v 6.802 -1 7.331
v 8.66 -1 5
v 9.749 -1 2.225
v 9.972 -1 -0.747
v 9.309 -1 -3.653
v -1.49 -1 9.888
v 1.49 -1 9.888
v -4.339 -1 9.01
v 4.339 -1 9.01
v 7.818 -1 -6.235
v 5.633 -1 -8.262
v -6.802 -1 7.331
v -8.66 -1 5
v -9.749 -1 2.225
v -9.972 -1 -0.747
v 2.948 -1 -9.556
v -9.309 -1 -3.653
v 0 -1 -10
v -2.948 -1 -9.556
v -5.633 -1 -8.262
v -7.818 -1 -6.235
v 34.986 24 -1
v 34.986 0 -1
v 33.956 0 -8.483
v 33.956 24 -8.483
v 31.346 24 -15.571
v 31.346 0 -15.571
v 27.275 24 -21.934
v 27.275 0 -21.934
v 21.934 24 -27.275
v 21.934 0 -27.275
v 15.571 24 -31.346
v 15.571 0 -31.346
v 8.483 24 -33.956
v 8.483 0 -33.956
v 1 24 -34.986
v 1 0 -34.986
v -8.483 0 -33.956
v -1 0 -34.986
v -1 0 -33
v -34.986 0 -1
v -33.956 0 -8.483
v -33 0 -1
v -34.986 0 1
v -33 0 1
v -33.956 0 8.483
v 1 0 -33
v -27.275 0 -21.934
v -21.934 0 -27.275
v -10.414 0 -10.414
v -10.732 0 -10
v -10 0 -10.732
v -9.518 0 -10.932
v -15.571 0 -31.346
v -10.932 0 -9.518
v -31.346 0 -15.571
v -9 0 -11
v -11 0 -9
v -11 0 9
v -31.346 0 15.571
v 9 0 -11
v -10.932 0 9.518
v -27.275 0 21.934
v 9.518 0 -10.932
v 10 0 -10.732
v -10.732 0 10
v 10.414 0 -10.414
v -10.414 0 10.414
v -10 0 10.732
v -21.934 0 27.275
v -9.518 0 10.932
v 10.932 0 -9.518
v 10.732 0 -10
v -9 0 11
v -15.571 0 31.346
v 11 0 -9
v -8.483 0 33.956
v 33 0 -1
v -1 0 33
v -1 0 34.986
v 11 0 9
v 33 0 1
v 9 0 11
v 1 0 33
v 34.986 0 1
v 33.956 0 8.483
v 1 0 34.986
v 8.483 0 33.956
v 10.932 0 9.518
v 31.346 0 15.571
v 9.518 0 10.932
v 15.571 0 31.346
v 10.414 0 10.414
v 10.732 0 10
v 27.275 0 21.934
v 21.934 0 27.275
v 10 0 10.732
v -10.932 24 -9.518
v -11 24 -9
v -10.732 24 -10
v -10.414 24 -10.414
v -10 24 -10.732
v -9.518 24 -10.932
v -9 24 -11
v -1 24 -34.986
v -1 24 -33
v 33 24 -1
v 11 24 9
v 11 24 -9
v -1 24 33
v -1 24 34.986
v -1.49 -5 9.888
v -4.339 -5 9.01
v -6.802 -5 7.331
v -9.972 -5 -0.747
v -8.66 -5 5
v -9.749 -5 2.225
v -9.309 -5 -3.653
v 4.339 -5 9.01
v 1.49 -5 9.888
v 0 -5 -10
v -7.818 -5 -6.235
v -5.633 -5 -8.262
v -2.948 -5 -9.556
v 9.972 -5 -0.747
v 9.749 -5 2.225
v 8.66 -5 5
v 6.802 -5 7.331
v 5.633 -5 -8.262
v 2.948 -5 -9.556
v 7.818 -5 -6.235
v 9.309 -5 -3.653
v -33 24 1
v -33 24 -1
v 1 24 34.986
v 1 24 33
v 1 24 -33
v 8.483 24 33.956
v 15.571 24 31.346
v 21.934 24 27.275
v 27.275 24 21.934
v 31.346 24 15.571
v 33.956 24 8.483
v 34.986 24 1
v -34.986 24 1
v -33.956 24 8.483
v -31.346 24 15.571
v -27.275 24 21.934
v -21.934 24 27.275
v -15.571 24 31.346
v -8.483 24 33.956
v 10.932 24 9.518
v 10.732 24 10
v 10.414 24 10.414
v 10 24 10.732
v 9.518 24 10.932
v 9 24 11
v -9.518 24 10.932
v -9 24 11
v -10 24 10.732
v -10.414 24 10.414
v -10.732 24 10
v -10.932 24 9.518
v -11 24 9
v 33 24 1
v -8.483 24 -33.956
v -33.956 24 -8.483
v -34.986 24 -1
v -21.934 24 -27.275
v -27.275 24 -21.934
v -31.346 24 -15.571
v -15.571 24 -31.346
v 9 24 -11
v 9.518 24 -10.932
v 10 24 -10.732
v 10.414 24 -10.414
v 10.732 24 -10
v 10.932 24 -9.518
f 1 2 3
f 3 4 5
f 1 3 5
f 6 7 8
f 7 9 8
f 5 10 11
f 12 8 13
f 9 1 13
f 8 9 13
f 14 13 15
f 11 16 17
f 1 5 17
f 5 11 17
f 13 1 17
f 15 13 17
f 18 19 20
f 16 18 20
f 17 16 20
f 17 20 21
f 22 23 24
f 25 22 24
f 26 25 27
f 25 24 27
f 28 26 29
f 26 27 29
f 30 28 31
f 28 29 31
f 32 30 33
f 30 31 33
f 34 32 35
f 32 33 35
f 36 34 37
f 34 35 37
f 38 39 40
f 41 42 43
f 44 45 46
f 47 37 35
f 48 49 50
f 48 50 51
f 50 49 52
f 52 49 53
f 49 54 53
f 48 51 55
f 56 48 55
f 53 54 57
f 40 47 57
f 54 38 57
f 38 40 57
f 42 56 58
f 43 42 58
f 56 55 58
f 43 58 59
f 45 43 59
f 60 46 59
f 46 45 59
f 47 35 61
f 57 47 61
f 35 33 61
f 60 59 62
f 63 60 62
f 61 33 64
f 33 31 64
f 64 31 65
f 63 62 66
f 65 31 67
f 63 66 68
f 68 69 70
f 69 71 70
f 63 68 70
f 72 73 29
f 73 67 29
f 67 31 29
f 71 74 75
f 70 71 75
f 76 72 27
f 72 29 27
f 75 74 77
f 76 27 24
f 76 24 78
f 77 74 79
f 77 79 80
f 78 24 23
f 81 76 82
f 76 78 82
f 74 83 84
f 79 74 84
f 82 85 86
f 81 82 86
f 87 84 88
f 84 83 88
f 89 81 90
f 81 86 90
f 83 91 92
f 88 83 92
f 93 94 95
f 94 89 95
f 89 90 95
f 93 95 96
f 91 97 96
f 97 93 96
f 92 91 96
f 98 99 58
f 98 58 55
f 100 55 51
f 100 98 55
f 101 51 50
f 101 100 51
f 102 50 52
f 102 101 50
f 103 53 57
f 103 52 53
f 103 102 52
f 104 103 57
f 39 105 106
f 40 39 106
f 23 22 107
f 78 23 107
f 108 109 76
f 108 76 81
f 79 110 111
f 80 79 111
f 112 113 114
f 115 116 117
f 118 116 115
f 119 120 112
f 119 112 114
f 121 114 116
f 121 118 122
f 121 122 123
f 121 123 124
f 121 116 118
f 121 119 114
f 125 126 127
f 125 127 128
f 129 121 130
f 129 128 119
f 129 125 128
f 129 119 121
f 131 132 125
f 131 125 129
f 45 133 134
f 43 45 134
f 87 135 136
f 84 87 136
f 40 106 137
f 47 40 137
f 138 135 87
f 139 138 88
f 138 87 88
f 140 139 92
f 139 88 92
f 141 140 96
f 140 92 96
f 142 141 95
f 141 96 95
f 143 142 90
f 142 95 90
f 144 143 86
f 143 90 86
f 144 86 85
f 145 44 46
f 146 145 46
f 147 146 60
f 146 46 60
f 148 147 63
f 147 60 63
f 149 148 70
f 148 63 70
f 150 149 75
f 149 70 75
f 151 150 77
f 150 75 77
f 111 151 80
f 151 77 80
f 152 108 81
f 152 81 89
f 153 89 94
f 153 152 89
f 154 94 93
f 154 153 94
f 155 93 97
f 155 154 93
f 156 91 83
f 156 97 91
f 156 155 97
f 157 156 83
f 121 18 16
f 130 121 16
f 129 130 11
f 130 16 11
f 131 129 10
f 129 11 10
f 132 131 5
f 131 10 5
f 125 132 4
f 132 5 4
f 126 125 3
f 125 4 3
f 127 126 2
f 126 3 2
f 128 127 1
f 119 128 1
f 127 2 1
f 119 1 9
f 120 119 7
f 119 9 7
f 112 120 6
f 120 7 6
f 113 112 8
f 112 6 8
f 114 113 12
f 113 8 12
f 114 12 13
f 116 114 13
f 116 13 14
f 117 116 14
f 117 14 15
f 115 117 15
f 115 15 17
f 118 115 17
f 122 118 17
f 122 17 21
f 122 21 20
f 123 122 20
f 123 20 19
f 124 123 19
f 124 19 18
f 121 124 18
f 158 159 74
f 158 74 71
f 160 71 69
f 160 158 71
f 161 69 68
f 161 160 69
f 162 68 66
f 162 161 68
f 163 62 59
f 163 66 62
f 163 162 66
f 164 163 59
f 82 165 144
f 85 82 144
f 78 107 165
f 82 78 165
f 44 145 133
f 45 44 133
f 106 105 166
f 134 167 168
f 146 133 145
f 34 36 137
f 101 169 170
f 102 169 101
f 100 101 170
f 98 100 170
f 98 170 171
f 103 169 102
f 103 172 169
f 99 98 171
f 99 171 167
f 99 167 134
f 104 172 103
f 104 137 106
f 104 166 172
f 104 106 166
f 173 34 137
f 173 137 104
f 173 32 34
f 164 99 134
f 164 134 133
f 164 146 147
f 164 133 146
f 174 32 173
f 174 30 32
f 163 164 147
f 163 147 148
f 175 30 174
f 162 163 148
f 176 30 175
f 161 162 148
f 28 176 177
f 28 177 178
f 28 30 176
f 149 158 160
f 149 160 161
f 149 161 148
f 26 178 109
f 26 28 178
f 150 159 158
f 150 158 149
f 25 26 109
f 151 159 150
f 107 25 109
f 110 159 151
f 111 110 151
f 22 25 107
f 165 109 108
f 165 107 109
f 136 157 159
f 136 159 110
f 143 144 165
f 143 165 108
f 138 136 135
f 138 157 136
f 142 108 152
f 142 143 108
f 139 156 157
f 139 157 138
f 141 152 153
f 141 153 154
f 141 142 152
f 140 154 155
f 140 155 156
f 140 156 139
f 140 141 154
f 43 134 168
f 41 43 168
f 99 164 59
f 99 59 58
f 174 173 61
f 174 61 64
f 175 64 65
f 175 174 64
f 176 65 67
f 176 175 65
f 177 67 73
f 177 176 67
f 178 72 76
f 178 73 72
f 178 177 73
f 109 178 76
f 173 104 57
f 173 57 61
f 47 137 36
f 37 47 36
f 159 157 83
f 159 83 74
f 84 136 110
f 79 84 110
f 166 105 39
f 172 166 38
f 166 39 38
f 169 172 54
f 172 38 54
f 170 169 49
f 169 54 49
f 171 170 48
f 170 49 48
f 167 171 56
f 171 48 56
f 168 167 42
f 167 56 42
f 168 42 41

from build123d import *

# Parameters (mm, degrees)
SKETCH1_R           = 35
BOSS_EXTRUDE1_DEPTH = 24
SKETCH2_R           = 10
BOSS_EXTRUDE2_DEPTH = 5
CUT_EXTRUDE1_DEPTH  = 25
CUT_EXTRUDE2_DEPTH  = 36


with BuildPart() as part:
    # Sketch1 → Boss-Extrude1 (new body)
    with BuildSketch(Plane(origin=(0, 0, 0), x_dir=(1, 0, 0), z_dir=(0, 1, 0))):
        with Locations(Location((0, 0, 0), (0, 0, 270))):
            Circle(SKETCH1_R)
    extrude(amount=BOSS_EXTRUDE1_DEPTH)

    # Sketch2 → Boss-Extrude2 (add)
    with BuildSketch(Plane.XZ):
        with Locations(Location((0, 0, 0), (0, 0, 270))):
            Circle(SKETCH2_R)
    extrude(amount=BOSS_EXTRUDE2_DEPTH)

    # Sketch3 → Cut-Extrude1 (cut)
    with BuildSketch(Plane(origin=(0, 24, 0), x_dir=(1, 0, 0), z_dir=(0, 1, 0))):
        with BuildLine():
            Line((-9, 11), (9, 11))
            ThreePointArc((9, 11), (10.414213562, 10.414213562), (11, 9))
            Line((11, 9), (11, -9))
            ThreePointArc((11, -9), (10.414213562, -10.414213562), (9, -11))
            Line((9, -11), (-9, -11))
            ThreePointArc((-9, -11), (-10.414213562, -10.414213562), (-11, -9))
            Line((-11, -9), (-11, 9))
            ThreePointArc((-11, 9), (-10.414213562, 10.414213562), (-9, 11))
        make_face()
    extrude(amount=-CUT_EXTRUDE1_DEPTH, mode=Mode.SUBTRACT)


with BuildPart() as cut_extrude1_piece_1:
    # of the separate pieces the step leaves, piece 1, a body of its own (cut_extrude1_pieces)
    add(part.part.solids().sort_by_distance((0, 0, 35))[0])

    # Sketch4 → Cut-Extrude2 (cut)
    with BuildSketch(Plane(origin=(0, 24, 0), x_dir=(1, 0, 0), z_dir=(0, 1, 0))):
        with BuildLine():
            Line((-1, 34.985711369), (-1, 33))
            Line((-1, 33), (1, 33))
            Line((1, 33), (1, 34.985711369))
            ThreePointArc((1, 34.985711369), (0, 35), (-1, 34.985711369))
        make_face()
        with BuildLine():
            Line((34.985711369, 1), (33, 1))
            Line((33, 1), (33, -1))
            Line((33, -1), (34.985711369, -1))
            ThreePointArc((34.985711369, -1), (35, 0), (34.985711369, 1))
        make_face()
        with BuildLine():
            Line((1, -34.985711369), (1, -33))
            Line((1, -33), (-1, -33))
            Line((-1, -33), (-1, -34.985711369))
            ThreePointArc((-1, -34.985711369), (0, -35), (1, -34.985711369))
        make_face()
        with BuildLine():
            Line((-34.985711369, -1), (-33, -1))
            Line((-33, -1), (-33, 1))
            Line((-33, 1), (-34.985711369, 1))
            ThreePointArc((-34.985711369, 1), (-35, 0), (-34.985711369, -1))
        make_face()
    extrude(amount=-CUT_EXTRUDE2_DEPTH, mode=Mode.SUBTRACT)


with BuildPart() as cut_extrude1_piece_2:
    # of the separate pieces the step leaves, piece 2, a body of its own (cut_extrude1_pieces)
    add(part.part.solids().sort_by_distance((0, -1, -10))[0])


solid = Compound([cut_extrude1_piece_1.part, cut_extrude1_piece_2.part])
